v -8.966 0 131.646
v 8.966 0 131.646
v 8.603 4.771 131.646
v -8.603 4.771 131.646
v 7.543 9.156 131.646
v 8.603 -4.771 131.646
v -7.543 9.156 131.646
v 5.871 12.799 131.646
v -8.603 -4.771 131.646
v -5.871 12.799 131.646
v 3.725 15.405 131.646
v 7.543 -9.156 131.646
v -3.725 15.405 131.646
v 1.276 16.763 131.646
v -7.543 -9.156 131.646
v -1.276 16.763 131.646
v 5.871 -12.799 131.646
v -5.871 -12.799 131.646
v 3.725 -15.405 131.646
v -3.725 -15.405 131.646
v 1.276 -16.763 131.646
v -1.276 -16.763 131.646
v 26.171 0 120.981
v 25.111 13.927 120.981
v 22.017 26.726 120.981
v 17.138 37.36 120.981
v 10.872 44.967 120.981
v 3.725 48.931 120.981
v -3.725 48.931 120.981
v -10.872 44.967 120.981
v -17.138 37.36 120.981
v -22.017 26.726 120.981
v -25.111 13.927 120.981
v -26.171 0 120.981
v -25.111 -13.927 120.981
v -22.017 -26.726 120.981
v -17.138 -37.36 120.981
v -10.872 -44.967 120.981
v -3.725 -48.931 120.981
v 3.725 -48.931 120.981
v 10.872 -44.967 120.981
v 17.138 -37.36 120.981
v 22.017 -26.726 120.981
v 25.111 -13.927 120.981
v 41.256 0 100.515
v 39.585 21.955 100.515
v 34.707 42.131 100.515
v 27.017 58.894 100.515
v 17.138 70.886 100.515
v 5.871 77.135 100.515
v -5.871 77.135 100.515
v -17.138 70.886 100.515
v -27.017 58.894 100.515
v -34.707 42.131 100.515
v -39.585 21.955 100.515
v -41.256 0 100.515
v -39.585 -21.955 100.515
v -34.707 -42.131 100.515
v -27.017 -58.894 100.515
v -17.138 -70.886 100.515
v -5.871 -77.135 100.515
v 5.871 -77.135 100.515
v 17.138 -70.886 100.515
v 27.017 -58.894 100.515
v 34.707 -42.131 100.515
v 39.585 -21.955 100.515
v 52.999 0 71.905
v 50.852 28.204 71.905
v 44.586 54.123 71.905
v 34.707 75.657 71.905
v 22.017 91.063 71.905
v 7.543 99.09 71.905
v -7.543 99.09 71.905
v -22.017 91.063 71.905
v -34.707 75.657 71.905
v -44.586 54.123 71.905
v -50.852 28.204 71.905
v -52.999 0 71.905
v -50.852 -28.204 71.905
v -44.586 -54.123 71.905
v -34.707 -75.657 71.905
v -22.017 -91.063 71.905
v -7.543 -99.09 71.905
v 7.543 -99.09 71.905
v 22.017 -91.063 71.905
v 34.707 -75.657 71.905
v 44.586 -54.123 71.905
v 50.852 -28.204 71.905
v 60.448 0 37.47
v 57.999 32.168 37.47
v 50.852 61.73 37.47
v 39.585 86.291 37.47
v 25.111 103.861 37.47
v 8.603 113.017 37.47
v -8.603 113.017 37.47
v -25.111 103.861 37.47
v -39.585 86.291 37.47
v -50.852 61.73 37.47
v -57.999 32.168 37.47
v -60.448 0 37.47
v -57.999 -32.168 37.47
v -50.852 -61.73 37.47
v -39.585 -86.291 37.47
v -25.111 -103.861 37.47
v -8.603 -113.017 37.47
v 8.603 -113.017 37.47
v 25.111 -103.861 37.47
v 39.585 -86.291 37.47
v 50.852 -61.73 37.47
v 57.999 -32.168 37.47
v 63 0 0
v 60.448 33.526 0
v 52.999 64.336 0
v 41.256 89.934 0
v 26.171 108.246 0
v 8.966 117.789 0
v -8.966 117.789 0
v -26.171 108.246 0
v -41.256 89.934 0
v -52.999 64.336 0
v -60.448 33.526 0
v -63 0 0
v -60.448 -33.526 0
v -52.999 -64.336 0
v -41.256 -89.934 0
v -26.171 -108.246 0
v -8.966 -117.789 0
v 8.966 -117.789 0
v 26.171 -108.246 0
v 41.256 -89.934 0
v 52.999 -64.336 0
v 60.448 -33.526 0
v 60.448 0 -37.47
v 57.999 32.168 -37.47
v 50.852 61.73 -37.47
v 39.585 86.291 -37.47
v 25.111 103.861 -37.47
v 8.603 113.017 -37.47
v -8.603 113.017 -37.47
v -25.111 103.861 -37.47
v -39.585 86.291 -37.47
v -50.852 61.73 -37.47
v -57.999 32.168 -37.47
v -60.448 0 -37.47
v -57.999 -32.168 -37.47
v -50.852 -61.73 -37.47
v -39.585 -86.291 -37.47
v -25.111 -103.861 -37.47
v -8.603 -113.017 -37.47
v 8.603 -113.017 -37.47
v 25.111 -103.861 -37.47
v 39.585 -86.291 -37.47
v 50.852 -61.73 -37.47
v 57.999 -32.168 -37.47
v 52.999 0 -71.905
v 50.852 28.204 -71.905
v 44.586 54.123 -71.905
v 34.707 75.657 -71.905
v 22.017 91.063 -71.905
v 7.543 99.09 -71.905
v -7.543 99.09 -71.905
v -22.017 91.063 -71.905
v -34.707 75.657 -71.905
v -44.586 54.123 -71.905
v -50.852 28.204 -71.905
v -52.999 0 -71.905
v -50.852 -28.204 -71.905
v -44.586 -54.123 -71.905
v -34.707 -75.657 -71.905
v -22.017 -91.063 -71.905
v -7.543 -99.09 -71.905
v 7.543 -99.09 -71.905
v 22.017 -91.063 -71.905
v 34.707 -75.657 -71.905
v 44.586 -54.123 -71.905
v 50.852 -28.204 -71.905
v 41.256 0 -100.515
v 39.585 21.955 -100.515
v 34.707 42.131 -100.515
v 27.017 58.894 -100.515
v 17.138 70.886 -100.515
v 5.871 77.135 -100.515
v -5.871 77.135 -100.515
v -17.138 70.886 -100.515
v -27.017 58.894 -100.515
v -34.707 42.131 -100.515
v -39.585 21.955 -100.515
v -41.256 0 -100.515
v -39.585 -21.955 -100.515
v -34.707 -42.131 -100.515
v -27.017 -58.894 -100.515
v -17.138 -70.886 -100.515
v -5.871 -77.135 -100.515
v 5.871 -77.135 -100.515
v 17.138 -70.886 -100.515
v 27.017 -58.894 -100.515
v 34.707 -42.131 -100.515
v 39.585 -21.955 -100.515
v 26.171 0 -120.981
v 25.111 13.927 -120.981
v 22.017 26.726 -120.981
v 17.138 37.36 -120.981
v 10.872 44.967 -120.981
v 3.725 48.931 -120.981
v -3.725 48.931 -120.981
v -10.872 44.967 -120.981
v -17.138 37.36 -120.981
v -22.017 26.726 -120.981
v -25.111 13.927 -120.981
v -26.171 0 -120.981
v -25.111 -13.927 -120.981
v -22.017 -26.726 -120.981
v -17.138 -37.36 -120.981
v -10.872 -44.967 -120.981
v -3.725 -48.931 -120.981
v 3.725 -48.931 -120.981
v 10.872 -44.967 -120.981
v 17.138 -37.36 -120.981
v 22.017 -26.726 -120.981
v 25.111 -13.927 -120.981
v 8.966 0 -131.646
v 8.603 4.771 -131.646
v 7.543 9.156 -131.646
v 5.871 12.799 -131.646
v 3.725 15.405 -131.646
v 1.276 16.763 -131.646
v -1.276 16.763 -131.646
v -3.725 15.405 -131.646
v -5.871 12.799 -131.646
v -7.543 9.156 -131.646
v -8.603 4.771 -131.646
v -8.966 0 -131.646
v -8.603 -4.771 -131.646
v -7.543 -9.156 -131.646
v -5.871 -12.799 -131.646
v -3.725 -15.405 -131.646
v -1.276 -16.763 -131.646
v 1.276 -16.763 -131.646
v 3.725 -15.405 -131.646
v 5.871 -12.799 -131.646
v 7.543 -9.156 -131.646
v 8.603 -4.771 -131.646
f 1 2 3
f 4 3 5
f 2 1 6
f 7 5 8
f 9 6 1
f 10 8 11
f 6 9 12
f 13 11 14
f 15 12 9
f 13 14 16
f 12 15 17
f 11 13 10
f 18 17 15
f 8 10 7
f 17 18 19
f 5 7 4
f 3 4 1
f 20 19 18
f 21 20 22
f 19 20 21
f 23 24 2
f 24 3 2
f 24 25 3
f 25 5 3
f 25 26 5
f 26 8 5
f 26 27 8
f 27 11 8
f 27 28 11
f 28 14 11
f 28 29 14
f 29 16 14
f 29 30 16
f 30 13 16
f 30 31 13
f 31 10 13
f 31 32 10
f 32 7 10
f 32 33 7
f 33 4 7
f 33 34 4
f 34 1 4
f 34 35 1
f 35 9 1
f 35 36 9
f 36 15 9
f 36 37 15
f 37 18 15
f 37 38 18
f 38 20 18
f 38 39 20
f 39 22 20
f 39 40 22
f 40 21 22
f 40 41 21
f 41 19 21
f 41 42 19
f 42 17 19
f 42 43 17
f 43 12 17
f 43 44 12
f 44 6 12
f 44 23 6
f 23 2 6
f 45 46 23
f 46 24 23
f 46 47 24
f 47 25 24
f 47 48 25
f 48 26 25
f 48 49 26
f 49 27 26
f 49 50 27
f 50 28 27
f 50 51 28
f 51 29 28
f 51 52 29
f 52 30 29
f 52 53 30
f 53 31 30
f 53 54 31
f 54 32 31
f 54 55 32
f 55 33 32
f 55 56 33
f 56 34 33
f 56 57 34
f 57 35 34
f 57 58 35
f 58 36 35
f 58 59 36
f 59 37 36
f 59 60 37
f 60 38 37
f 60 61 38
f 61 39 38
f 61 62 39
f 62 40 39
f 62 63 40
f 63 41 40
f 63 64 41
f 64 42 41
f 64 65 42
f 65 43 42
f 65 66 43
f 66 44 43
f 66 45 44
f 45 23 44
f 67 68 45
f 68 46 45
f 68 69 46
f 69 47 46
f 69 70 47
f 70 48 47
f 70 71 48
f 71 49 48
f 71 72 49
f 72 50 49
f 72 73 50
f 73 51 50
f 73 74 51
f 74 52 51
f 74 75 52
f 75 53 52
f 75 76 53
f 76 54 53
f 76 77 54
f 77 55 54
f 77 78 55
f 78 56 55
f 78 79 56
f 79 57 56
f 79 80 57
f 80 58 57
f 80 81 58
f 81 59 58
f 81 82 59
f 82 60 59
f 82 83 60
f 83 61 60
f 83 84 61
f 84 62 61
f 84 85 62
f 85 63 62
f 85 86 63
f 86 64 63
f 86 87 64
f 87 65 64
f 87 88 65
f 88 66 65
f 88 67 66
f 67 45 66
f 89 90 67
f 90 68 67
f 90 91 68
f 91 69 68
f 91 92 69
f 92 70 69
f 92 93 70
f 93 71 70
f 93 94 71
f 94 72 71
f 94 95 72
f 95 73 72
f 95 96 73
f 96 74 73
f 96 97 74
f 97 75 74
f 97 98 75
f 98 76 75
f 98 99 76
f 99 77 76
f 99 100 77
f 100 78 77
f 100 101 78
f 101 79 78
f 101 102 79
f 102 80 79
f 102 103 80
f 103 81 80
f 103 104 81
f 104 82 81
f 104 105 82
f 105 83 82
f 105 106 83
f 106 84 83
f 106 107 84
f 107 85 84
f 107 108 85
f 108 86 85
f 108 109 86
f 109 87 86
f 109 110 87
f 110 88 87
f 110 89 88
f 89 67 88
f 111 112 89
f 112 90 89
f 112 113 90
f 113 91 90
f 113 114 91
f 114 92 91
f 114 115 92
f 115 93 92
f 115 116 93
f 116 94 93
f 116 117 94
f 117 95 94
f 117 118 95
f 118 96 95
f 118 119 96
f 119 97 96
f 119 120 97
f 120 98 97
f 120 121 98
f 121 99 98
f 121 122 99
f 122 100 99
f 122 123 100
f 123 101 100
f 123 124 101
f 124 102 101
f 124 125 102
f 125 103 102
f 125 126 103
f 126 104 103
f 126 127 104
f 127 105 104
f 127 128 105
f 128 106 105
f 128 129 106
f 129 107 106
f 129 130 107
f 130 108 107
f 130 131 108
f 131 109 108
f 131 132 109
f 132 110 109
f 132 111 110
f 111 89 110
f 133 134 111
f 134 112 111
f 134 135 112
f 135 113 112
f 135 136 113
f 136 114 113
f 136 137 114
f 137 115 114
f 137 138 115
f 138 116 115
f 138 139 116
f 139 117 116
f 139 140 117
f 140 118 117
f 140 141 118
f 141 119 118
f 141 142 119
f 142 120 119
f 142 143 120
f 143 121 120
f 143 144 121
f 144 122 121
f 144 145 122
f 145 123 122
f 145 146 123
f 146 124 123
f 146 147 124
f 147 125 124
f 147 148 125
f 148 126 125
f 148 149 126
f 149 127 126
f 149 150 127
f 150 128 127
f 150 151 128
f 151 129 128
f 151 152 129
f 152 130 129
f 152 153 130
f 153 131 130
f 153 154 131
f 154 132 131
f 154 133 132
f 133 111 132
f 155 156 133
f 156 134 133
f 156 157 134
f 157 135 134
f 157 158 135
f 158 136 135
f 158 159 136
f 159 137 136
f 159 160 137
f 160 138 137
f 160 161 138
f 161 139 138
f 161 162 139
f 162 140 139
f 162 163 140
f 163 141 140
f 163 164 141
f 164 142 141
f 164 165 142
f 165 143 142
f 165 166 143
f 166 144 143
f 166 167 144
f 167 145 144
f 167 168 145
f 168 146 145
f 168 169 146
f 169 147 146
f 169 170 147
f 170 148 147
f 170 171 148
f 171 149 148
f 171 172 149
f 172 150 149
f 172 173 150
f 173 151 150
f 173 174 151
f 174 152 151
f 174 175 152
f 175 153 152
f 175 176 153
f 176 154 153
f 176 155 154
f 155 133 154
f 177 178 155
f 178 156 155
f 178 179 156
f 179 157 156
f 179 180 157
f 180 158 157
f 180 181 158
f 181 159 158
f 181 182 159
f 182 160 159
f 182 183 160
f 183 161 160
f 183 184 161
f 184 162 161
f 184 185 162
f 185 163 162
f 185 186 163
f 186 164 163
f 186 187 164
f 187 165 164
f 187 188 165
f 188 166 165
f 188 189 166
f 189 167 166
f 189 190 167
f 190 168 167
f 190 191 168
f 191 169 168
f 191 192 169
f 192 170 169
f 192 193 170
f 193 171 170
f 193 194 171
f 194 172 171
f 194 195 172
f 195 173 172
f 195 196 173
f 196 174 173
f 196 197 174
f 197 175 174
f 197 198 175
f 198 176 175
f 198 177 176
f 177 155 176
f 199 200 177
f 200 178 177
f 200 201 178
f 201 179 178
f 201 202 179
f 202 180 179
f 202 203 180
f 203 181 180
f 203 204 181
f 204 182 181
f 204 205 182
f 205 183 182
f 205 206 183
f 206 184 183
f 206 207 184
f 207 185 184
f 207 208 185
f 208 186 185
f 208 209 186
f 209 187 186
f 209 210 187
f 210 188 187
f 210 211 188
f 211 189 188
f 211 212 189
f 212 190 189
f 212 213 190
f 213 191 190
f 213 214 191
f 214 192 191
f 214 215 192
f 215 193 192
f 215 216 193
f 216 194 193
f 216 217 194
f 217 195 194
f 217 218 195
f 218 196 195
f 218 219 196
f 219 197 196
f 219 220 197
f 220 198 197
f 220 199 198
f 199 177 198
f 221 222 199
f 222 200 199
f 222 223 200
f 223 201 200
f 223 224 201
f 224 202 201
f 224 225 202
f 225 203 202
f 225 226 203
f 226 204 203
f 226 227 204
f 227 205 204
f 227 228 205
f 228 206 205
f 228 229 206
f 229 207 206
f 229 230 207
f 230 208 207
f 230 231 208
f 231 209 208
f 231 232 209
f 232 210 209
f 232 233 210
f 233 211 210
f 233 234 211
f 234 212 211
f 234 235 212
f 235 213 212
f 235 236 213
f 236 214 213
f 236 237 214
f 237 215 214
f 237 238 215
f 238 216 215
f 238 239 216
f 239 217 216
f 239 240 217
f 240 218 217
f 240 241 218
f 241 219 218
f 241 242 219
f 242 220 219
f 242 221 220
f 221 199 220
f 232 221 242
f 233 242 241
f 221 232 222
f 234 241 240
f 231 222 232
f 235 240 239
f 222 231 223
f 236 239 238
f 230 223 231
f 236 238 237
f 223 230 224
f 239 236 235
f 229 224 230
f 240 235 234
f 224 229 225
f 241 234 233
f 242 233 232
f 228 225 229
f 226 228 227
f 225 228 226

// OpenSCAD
// Generated by SolidPython 1.0.1 on 2020-07-29 00:46:49


scale(v = [9, 17, 19]) {
	sphere(r = 7);
}
/***********************************************
*********      SolidPython code:      **********
************************************************
 
# import packages: SolidPython
from solid import *
from solid.utils import *
from itertools import chain, combinations, permutations


class Resize:

    def __init__(self, scad_file):
        self.scad_file = scad_file
        #self.scad_file = import_scad(scad_file)
        # cone/cylinder param:
        self.r1 = 0
        self.r2 = 0
        self.h = 0
        # rectangular prism param:
        self.w = 0
        self.l = 0
        # ellipse param:
        self.r = 0

    # import OpenScad code (file name corresponds to shape)


    # classify shape + parameters
    def assign(self, param1, param2, param3):
        if self.scad_file == 'cone.scad':
            self.r1 = param1
            self.r2 = param2
            self.h = param3
        elif self.scad_file == 'cylinder.scad':
            self.r1 = param1
            self.r2 = param2
            self.h = param3
        elif self.scad_file == 'rectangularPrism.scad':
            self.h = param1
            self.l = param2
            self.w = param3
        else:
            self.r = param1
            self.h = param2

    # resize parameters
    def iterate(self):
        x = range(3, 20, 2)
        i = 1
        if self.scad_file == 'cone.scad':
            tempList = list(permutations(x, 2))
            for temp in tempList:
                param1 = temp[0]
                param2 = temp[1]
                filepath = 'produced_scad_files/' + 'cone' + str(param1) + '_' + str(param2) + '_' + '.scad'
                scad_render_to_file(cylinder(h=param1, r1=param2, r2=0), filepath)

        elif self.scad_file == 'cylinder.scad':
            tempList = list(permutations(x, 3))
            for temp in tempList:
                param1 = temp[0]
                param2 = temp[1]
                filepath = 'produced_scad_files/' + 'cylinder' + str(param1) + '_' + str(param2) + '_' + '.scad'
                scad_render_to_file(cylinder(h=param1, r1=param2, r2=param2), filepath)

        elif self.scad_file == 'rectangularPrism.scad':
            tempList = list(permutations(x, 3))
            for temp in tempList:
                param1 = temp[0]
                param2 = temp[1]
                param3 = temp[2]
                filepath = 'produced_scad_files/' + 'rectangularPrism' + str(param1) + '_' + str(param2) + '_' + str(
                    param3) + '.scad'
                scad_render_to_file(cube(size=(param1, param2, param3)), filepath)

        elif self.scad_file == 'ellipse.scad':
            tempList = list(permutations(x, 4))
            for temp in tempList:
                param1 = temp[0]
                param2 = temp[1]
                param3 = temp[2]
                param4 = temp[3]
                filepath = 'produced_scad_files/' + 'ellipse' + str(param1) + '_' + str(param2) + '_' + str(param3) + '_' + str(param4) + '.scad'
                scad_render_to_file(scale([param1, param2, param3])(sphere(r=param4)), filepath)

    def render_to_scadfile(self):
        scad_render_to_file(scad, 'example.scad') 
 
************************************************/
